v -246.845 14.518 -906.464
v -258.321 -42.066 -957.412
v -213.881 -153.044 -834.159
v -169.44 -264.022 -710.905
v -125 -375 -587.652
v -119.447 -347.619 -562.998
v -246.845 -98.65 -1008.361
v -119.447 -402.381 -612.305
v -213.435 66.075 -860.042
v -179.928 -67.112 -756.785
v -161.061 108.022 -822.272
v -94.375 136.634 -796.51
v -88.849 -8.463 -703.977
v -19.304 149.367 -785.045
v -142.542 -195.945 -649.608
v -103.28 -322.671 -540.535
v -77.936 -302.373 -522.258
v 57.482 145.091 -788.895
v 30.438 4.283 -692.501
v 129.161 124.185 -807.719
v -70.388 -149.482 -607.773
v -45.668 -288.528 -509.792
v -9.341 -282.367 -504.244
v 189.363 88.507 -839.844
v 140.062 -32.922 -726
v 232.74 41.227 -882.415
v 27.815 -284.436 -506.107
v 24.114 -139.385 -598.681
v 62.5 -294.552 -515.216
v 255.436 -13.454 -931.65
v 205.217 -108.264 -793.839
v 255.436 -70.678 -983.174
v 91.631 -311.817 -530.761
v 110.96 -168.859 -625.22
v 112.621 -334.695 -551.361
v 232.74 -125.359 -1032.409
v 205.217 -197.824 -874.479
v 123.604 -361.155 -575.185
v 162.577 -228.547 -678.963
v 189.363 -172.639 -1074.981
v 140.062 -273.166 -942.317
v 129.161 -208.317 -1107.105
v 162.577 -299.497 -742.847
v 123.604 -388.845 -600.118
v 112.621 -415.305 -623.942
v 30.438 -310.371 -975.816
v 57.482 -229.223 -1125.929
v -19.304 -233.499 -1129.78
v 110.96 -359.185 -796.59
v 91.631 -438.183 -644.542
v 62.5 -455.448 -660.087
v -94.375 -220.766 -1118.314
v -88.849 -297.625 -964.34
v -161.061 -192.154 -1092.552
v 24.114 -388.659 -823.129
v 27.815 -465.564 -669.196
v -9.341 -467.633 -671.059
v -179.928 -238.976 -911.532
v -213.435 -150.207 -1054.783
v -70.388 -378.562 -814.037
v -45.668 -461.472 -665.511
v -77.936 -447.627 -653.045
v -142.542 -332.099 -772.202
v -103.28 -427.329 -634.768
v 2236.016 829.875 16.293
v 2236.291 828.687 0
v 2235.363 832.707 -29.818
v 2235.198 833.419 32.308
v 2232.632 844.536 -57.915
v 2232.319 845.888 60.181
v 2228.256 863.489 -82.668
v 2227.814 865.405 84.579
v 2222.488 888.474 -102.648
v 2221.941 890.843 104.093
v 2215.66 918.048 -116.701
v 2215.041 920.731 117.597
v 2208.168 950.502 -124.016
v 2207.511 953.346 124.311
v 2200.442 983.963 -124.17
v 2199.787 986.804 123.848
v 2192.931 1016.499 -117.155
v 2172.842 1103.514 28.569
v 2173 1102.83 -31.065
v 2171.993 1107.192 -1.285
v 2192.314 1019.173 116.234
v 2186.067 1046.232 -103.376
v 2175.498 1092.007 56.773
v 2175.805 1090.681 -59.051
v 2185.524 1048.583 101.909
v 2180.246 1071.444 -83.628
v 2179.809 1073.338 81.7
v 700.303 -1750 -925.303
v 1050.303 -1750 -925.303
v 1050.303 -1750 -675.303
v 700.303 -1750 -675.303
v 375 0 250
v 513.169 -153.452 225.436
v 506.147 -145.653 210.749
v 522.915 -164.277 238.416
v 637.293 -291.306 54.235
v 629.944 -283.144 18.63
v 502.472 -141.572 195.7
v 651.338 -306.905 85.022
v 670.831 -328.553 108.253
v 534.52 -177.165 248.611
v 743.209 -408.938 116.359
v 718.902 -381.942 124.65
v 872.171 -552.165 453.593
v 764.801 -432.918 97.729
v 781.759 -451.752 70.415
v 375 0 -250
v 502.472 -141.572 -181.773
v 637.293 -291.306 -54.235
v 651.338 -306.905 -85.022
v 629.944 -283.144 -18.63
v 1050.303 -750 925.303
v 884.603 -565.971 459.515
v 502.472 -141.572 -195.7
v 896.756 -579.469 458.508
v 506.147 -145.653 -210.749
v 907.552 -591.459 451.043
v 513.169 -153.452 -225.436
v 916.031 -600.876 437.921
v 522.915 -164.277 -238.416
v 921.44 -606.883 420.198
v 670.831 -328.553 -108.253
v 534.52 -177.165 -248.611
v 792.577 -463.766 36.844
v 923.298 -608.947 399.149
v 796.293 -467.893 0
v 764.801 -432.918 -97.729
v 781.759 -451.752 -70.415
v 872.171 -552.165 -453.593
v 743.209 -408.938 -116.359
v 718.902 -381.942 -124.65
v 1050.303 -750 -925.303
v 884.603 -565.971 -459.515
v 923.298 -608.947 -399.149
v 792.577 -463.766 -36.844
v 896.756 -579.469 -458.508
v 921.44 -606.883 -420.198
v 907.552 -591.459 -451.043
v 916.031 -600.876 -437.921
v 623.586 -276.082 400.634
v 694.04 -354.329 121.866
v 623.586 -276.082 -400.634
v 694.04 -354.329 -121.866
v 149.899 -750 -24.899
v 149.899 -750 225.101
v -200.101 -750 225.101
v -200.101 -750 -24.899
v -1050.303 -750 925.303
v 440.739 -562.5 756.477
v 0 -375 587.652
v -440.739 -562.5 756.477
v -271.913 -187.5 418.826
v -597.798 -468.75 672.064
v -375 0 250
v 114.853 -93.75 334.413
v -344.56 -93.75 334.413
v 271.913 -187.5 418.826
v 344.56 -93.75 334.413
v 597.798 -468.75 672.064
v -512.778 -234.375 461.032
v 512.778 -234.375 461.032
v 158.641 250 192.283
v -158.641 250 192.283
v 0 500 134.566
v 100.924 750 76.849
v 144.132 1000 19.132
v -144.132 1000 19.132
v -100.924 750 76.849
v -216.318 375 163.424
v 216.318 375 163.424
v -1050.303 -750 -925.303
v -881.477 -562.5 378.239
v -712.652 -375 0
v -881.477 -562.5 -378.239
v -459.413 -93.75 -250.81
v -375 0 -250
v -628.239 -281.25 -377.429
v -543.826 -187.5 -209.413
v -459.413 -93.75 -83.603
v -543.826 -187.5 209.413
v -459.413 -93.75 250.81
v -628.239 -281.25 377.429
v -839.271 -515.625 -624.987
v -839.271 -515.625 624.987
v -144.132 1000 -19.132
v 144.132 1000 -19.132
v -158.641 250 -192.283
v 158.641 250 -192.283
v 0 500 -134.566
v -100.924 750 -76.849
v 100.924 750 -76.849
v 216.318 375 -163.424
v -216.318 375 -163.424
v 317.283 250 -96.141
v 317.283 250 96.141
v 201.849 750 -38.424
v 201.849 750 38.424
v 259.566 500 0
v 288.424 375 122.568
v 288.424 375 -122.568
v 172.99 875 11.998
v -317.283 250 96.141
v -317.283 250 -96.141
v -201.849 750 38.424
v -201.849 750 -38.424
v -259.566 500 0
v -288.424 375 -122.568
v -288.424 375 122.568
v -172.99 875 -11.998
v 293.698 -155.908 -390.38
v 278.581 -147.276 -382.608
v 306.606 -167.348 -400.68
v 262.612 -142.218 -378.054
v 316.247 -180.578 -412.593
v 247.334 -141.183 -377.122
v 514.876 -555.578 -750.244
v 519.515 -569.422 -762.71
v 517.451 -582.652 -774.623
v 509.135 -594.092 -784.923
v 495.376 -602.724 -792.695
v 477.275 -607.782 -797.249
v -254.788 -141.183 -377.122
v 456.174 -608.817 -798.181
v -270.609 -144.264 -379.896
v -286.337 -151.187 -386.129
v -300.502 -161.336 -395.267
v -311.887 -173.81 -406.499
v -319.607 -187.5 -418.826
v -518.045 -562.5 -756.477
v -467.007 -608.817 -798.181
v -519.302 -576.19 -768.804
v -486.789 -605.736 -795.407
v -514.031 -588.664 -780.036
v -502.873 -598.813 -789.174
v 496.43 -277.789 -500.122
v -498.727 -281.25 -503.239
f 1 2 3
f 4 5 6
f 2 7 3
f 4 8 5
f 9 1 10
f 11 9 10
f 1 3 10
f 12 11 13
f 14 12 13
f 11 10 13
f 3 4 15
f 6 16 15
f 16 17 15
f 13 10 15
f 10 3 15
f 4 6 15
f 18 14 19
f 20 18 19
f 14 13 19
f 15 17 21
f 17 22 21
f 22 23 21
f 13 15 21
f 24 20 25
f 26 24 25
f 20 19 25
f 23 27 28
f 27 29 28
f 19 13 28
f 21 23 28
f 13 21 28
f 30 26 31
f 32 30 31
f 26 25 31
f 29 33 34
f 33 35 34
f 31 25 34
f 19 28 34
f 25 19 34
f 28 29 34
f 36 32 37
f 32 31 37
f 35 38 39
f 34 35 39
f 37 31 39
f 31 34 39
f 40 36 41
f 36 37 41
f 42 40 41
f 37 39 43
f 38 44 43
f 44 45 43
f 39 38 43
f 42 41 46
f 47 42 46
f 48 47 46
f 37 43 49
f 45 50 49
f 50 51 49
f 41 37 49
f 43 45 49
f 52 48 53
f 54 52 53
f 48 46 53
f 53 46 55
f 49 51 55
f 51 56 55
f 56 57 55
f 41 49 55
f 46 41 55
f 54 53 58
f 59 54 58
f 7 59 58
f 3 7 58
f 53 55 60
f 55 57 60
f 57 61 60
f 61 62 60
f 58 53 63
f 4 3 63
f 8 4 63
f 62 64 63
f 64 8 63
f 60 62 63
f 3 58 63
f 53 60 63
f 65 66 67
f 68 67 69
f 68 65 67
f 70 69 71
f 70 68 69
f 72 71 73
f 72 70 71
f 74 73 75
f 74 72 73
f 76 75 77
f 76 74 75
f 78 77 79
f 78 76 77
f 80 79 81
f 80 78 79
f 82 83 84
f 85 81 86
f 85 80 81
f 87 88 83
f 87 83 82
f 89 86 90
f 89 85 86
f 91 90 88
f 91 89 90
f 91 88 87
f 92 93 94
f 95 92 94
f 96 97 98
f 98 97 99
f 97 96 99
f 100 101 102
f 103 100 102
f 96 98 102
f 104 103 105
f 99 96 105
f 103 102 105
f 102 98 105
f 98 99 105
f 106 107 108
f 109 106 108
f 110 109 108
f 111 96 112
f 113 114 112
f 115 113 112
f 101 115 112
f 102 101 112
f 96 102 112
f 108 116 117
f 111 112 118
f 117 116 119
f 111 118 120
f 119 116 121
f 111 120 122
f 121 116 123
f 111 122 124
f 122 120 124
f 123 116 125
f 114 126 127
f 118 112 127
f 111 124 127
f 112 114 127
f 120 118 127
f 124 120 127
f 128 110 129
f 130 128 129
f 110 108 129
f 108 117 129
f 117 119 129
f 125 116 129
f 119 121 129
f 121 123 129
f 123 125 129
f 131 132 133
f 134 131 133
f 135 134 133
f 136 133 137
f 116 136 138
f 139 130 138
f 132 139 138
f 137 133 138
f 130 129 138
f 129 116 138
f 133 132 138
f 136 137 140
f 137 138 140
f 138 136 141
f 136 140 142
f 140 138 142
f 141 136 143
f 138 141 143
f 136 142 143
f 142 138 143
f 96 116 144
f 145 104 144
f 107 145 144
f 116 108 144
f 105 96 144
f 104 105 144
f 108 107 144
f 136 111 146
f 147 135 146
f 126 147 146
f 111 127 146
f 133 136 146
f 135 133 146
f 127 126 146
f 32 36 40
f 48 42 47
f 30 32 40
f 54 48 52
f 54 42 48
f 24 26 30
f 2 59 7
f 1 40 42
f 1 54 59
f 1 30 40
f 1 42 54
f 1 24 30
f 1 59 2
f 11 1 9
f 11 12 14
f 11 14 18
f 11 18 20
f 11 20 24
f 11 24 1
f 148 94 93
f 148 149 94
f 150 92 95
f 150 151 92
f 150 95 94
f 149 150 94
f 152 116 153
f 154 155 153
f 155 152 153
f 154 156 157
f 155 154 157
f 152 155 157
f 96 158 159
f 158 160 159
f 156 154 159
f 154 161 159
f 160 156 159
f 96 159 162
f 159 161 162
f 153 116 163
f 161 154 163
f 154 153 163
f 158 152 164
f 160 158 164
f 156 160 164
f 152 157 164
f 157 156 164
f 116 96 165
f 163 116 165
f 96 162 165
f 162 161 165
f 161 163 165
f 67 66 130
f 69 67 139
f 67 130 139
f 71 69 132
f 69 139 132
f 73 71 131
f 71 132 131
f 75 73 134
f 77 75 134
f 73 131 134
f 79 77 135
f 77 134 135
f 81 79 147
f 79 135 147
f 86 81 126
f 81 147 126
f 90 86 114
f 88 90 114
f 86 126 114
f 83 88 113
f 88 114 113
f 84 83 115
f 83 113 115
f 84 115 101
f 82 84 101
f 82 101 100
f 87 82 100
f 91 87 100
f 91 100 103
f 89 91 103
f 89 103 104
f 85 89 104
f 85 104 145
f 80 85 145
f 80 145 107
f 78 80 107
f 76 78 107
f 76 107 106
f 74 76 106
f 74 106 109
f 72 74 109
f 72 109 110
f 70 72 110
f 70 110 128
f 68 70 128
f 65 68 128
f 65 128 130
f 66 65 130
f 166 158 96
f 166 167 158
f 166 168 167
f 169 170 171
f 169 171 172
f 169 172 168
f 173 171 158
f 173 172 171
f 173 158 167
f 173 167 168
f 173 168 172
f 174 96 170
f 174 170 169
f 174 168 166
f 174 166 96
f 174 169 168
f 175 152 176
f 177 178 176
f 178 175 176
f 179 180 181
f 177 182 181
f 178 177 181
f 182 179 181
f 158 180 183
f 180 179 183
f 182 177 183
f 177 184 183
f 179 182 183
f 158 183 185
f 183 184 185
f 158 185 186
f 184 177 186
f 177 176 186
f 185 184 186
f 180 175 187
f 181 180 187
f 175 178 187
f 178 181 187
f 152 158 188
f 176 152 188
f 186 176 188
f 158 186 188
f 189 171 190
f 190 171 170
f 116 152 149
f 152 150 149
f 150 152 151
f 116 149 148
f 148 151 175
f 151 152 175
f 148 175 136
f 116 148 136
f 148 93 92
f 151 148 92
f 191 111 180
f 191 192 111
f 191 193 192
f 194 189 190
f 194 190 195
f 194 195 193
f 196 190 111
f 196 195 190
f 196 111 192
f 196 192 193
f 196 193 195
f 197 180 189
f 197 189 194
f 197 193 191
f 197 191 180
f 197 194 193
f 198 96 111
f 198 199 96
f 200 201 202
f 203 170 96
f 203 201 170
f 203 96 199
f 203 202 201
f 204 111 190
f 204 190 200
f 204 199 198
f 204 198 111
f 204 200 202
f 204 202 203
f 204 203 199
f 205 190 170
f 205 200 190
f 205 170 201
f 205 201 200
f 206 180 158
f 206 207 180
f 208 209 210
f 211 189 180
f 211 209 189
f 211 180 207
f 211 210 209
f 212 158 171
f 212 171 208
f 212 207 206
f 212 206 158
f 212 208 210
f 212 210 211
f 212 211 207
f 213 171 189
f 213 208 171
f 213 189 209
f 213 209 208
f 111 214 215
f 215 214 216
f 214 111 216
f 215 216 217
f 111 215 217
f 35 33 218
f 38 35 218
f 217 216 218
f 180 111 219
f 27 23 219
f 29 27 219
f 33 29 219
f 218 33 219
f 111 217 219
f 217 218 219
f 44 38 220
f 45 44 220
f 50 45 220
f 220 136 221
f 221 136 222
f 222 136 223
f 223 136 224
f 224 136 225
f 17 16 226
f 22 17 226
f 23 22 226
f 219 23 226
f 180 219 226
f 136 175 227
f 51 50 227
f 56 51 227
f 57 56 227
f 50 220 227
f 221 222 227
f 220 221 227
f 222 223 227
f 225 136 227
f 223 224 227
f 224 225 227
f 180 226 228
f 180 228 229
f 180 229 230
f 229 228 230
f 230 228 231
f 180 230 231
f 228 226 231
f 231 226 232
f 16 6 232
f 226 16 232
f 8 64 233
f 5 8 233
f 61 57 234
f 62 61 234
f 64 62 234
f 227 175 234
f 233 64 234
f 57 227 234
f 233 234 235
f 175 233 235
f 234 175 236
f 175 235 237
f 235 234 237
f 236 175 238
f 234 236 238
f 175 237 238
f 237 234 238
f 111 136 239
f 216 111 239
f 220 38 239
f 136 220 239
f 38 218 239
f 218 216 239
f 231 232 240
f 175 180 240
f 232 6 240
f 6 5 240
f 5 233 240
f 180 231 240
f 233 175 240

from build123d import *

# Parameters (mm, degrees)
CROQUIS1_W                        = 750
CROQUIS1_H                        = 500
SALIENTE_EXTRUIR1_DEPTH           = 1000
SALIENTE_EXTRUIR1_TAPER           = 13
SALIENTE_EXTRUIR1_OTHER_WAY_DEPTH = 750
SALIENTE_EXTRUIR1_OTHER_WAY_TAPER = -42
CROQUIS3_R                        = 125
SALIENTE_EXTRUIR3_DEPTH           = 497.562106
SALIENTE_EXTRUIR3_DRAFT           = -15
SALIENTE_EXTRUIR4_REACH           = 2572.697
CROQUIS4_R                        = 125


with BuildPart() as part:
    # Croquis1 → Saliente-Extruir1 (new body)
    with BuildSketch(Plane(origin=(0, 0, 0), x_dir=(1, 0, 0), z_dir=(0, 1, 0))):
        Rectangle(CROQUIS1_W, CROQUIS1_H)
    extrude(amount=SALIENTE_EXTRUIR1_DEPTH, taper=SALIENTE_EXTRUIR1_TAPER)

    # Croquis1 → Saliente-Extruir1 other way (add)
    with BuildSketch(Plane(origin=(0, 0, 0), x_dir=(1, 0, 0), z_dir=(0, 1, 0))):
        Rectangle(CROQUIS1_W, CROQUIS1_H)
    extrude(amount=-SALIENTE_EXTRUIR1_OTHER_WAY_DEPTH, taper=SALIENTE_EXTRUIR1_OTHER_WAY_TAPER)

    # Saliente-Extruir2: read off the stored shape, not the designer's step
    # Saliente-Extruir2: loft between two sections, ruled curve by curve
    saliente_extruir2_from = [
        Edge.make_line((1050.303033223, -1750, -925.303033223), (700.303033223, -1750, -925.303033223)),
        Edge.make_line((1050.303033223, -1750, -675.303033223), (1050.303033223, -1750, -925.303033223)),
        Edge.make_line((700.303033223, -1750, -675.303033223), (1050.303033223, -1750, -675.303033223)),
        Edge.make_line((700.303033223, -1750, -925.303033223), (700.303033223, -1750, -675.303033223)),
    ]
    saliente_extruir2_to = [
        Edge.make_line((149.898988926, -750, -24.898988926), (-200.101011074, -750, -24.898988926)),
        Edge.make_line((149.898988926, -750, 225.101011074), (149.898988926, -750, -24.898988926)),
        Edge.make_line((-200.101011074, -750, 225.101011074), (149.898988926, -750, 225.101011074)),
        Edge.make_line((-200.101011074, -750, -24.898988926), (-200.101011074, -750, 225.101011074)),
    ]
    saliente_extruir2 = Solid(Shell([*[Face.make_surface_from_curves(saliente_extruir2_from[k], saliente_extruir2_to[k]) for k in range(4)], Face(Wire(saliente_extruir2_from)), Face(Wire(saliente_extruir2_to))]))
    add(saliente_extruir2)


with BuildPart() as saliente_extruir3_tool:
    # Croquis3 → Saliente-Extruir3 (with draft: the straight prism first)
    with BuildSketch(Plane(origin=(0, 124.315236921, -138.066057908), x_dir=(-1, 0, 0), z_dir=(0, 0.6691306063588595, -0.7431448254773932))):
        with Locations((0, -671.894925192)):
            Circle(CROQUIS3_R)
    extrude(amount=SALIENTE_EXTRUIR3_DEPTH)
    # Saliente-Extruir3: the draft: its side faces are tilted about the plane it starts from
    saliente_extruir3_sides = [saliente_extruir3_tool.faces().sort_by_distance(p)[0] for p in [
        (125, -208.532983156, -772.531868825),
    ]]
    draft(saliente_extruir3_sides, Plane(origin=(0, 124.315236921, -138.066057908), x_dir=(-1, 0, 0), z_dir=(0, 0.6691306063588595, -0.7431448254773932)), SALIENTE_EXTRUIR3_DRAFT)


with BuildPart() as part_1:
    add(part.part)

    # Saliente-Extruir3: add saliente_extruir3_tool
    add(saliente_extruir3_tool.part)

    # Saliente-Extruir4: up to this plane
    saliente_extruir4_end = Plane(origin=(2323.74012957, 449.902108688, 250), z_dir=(0.9743700647852351, 0.2249510543438655, 0))
    # Croquis4 → Saliente-Extruir4 (add, up to the surface)
    with BuildSketch(Plane(origin=(207.099086863, 186.472855382, 0), x_dir=(0, 0, -1), z_dir=(0.7431448254773932, 0.6691306063588595, 0)), mode=Mode.PRIVATE) as saliente_extruir4_sk1:
        with Locations(Location((0, -755.536250987, 0), (0, 0, 270))):
            Circle(CROQUIS4_R)
    saliente_extruir4_tool1 = split(extrude(saliente_extruir4_sk1.sketch, amount=SALIENTE_EXTRUIR4_REACH, mode=Mode.PRIVATE), bisect_by=saliente_extruir4_end, keep=Keep.BOTH, mode=Mode.PRIVATE)
    add(saliente_extruir4_tool1.solids().sort_by_distance((712.651517, -375, 0))[0])


solid = part_1.part
